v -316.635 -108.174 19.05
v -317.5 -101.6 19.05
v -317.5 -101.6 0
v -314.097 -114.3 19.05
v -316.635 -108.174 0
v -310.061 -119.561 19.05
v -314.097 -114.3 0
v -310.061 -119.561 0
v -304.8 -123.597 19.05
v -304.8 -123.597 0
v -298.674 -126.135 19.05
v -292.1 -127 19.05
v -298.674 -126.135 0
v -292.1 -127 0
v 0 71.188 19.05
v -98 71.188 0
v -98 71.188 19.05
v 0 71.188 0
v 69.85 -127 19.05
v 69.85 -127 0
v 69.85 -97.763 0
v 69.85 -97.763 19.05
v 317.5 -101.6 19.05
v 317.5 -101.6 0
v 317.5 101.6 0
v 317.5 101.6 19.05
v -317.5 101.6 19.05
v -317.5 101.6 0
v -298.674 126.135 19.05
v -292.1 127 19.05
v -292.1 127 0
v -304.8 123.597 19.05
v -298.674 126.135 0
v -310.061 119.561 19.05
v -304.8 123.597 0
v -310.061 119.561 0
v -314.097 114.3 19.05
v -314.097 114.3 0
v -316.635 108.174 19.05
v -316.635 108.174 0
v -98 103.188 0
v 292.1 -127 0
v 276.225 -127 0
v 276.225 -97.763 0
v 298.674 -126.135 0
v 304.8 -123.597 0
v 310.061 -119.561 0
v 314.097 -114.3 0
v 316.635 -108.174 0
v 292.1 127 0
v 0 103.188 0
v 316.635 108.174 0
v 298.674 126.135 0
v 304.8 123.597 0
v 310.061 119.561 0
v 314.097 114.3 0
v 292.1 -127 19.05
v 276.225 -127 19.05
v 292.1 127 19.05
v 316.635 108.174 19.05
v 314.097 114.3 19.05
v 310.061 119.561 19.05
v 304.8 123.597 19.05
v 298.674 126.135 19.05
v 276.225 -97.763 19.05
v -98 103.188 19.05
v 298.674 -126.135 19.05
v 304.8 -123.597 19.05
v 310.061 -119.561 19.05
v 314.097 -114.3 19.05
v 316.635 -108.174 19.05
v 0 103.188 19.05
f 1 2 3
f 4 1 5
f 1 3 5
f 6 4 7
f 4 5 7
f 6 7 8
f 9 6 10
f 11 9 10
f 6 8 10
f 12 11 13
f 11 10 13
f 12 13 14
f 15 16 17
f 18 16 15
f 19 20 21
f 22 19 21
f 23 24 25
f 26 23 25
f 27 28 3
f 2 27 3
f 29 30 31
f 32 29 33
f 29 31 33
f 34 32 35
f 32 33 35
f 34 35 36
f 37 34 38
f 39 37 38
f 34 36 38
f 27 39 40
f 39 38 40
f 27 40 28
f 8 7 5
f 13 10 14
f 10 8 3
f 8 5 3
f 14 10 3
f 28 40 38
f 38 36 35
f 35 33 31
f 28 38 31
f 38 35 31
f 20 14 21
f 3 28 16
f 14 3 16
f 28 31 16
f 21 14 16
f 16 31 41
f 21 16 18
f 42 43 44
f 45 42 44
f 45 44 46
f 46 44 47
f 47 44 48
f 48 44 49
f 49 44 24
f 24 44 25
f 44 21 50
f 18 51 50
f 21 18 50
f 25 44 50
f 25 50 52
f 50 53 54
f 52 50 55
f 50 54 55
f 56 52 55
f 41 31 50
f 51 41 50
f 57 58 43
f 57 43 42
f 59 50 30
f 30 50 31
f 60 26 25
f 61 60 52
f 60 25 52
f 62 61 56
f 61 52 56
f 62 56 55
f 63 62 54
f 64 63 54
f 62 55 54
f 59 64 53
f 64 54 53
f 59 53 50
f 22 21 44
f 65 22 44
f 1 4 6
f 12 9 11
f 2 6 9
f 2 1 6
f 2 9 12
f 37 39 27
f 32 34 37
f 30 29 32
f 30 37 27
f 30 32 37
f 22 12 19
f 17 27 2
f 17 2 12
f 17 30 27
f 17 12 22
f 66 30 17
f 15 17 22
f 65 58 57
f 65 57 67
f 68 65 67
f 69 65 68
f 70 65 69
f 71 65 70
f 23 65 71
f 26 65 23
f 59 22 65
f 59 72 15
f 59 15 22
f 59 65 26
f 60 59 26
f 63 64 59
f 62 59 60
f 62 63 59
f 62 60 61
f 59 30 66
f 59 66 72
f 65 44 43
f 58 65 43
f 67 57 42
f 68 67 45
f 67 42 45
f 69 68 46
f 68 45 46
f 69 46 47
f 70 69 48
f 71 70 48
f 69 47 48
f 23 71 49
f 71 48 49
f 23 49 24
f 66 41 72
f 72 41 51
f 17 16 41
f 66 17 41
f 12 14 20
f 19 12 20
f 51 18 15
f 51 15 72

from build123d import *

# Parameters (mm, degrees)
F0_W     = 98
F0_H     = 32
F1_DEPTH = 19.05


with BuildPart() as f1:
    # F0 (on Top) → F1 (new body)
    with BuildSketch(Plane.XY):
        with BuildLine():
            Line((276.225, -127), (292.1, -127))
            ThreePointArc((292.1, -127), (310.060512, -119.560512), (317.5, -101.6))
            Line((317.5, -101.6), (317.5, 101.6))
            ThreePointArc((317.5, 101.6), (310.060512, 119.560512), (292.1, 127))
            Line((292.1, 127), (-292.1, 127))
            ThreePointArc((-292.1, 127), (-310.060512, 119.560512), (-317.5, 101.6))
            Line((-317.5, 101.6), (-317.5, -101.6))
            ThreePointArc((-317.5, -101.6), (-310.060512, -119.560512), (-292.1, -127))
            Line((-292.1, -127), (69.85, -127))
            Line((69.85, -127), (69.85, -107.95))
            ThreePointArc((69.85, -107.95), (54.134552, -101.440448), (47.625, -85.725))
            Line((47.625, -85.725), (47.625, 80.9625))
            ThreePointArc((47.625, 80.9625), (54.134552, 96.677948), (69.85, 103.1875))
            Line((69.85, 103.1875), (276.225, 103.1875))
            ThreePointArc((276.225, 103.1875), (291.940448, 96.677948), (298.45, 80.9625))
            Line((298.45, 80.9625), (298.45, -85.725))
            ThreePointArc((298.45, -85.725), (291.940448, -101.440448), (276.225, -107.95))
            Line((276.225, -107.95), (276.225, -127))
        make_face()
        with Locations((-49, 87.1875)):
            Rectangle(F0_W, F0_H, mode=Mode.SUBTRACT)
        with BuildLine():
            Line((276.225, -97.762614), (276.225, -107.95))
            ThreePointArc((276.225, -107.95), (291.940448, -101.440448), (298.45, -85.725))
            Line((298.45, -85.725), (298.45, 80.9625))
            ThreePointArc((298.45, 80.9625), (291.940448, 96.677948), (276.225, 103.1875))
            Line((276.225, 103.1875), (69.85, 103.1875))
            ThreePointArc((69.85, 103.1875), (54.134552, 96.677948), (47.625, 80.9625))
            Line((47.625, 80.9625), (47.625, -85.725))
            ThreePointArc((47.625, -85.725), (54.134552, -101.440448), (69.85, -107.95))
            Line((69.85, -107.95), (69.85, -97.762614))
            Line((69.85, -97.762614), (276.225, -97.762614))
        make_face()
    extrude(amount=F1_DEPTH)


solid = f1.part
